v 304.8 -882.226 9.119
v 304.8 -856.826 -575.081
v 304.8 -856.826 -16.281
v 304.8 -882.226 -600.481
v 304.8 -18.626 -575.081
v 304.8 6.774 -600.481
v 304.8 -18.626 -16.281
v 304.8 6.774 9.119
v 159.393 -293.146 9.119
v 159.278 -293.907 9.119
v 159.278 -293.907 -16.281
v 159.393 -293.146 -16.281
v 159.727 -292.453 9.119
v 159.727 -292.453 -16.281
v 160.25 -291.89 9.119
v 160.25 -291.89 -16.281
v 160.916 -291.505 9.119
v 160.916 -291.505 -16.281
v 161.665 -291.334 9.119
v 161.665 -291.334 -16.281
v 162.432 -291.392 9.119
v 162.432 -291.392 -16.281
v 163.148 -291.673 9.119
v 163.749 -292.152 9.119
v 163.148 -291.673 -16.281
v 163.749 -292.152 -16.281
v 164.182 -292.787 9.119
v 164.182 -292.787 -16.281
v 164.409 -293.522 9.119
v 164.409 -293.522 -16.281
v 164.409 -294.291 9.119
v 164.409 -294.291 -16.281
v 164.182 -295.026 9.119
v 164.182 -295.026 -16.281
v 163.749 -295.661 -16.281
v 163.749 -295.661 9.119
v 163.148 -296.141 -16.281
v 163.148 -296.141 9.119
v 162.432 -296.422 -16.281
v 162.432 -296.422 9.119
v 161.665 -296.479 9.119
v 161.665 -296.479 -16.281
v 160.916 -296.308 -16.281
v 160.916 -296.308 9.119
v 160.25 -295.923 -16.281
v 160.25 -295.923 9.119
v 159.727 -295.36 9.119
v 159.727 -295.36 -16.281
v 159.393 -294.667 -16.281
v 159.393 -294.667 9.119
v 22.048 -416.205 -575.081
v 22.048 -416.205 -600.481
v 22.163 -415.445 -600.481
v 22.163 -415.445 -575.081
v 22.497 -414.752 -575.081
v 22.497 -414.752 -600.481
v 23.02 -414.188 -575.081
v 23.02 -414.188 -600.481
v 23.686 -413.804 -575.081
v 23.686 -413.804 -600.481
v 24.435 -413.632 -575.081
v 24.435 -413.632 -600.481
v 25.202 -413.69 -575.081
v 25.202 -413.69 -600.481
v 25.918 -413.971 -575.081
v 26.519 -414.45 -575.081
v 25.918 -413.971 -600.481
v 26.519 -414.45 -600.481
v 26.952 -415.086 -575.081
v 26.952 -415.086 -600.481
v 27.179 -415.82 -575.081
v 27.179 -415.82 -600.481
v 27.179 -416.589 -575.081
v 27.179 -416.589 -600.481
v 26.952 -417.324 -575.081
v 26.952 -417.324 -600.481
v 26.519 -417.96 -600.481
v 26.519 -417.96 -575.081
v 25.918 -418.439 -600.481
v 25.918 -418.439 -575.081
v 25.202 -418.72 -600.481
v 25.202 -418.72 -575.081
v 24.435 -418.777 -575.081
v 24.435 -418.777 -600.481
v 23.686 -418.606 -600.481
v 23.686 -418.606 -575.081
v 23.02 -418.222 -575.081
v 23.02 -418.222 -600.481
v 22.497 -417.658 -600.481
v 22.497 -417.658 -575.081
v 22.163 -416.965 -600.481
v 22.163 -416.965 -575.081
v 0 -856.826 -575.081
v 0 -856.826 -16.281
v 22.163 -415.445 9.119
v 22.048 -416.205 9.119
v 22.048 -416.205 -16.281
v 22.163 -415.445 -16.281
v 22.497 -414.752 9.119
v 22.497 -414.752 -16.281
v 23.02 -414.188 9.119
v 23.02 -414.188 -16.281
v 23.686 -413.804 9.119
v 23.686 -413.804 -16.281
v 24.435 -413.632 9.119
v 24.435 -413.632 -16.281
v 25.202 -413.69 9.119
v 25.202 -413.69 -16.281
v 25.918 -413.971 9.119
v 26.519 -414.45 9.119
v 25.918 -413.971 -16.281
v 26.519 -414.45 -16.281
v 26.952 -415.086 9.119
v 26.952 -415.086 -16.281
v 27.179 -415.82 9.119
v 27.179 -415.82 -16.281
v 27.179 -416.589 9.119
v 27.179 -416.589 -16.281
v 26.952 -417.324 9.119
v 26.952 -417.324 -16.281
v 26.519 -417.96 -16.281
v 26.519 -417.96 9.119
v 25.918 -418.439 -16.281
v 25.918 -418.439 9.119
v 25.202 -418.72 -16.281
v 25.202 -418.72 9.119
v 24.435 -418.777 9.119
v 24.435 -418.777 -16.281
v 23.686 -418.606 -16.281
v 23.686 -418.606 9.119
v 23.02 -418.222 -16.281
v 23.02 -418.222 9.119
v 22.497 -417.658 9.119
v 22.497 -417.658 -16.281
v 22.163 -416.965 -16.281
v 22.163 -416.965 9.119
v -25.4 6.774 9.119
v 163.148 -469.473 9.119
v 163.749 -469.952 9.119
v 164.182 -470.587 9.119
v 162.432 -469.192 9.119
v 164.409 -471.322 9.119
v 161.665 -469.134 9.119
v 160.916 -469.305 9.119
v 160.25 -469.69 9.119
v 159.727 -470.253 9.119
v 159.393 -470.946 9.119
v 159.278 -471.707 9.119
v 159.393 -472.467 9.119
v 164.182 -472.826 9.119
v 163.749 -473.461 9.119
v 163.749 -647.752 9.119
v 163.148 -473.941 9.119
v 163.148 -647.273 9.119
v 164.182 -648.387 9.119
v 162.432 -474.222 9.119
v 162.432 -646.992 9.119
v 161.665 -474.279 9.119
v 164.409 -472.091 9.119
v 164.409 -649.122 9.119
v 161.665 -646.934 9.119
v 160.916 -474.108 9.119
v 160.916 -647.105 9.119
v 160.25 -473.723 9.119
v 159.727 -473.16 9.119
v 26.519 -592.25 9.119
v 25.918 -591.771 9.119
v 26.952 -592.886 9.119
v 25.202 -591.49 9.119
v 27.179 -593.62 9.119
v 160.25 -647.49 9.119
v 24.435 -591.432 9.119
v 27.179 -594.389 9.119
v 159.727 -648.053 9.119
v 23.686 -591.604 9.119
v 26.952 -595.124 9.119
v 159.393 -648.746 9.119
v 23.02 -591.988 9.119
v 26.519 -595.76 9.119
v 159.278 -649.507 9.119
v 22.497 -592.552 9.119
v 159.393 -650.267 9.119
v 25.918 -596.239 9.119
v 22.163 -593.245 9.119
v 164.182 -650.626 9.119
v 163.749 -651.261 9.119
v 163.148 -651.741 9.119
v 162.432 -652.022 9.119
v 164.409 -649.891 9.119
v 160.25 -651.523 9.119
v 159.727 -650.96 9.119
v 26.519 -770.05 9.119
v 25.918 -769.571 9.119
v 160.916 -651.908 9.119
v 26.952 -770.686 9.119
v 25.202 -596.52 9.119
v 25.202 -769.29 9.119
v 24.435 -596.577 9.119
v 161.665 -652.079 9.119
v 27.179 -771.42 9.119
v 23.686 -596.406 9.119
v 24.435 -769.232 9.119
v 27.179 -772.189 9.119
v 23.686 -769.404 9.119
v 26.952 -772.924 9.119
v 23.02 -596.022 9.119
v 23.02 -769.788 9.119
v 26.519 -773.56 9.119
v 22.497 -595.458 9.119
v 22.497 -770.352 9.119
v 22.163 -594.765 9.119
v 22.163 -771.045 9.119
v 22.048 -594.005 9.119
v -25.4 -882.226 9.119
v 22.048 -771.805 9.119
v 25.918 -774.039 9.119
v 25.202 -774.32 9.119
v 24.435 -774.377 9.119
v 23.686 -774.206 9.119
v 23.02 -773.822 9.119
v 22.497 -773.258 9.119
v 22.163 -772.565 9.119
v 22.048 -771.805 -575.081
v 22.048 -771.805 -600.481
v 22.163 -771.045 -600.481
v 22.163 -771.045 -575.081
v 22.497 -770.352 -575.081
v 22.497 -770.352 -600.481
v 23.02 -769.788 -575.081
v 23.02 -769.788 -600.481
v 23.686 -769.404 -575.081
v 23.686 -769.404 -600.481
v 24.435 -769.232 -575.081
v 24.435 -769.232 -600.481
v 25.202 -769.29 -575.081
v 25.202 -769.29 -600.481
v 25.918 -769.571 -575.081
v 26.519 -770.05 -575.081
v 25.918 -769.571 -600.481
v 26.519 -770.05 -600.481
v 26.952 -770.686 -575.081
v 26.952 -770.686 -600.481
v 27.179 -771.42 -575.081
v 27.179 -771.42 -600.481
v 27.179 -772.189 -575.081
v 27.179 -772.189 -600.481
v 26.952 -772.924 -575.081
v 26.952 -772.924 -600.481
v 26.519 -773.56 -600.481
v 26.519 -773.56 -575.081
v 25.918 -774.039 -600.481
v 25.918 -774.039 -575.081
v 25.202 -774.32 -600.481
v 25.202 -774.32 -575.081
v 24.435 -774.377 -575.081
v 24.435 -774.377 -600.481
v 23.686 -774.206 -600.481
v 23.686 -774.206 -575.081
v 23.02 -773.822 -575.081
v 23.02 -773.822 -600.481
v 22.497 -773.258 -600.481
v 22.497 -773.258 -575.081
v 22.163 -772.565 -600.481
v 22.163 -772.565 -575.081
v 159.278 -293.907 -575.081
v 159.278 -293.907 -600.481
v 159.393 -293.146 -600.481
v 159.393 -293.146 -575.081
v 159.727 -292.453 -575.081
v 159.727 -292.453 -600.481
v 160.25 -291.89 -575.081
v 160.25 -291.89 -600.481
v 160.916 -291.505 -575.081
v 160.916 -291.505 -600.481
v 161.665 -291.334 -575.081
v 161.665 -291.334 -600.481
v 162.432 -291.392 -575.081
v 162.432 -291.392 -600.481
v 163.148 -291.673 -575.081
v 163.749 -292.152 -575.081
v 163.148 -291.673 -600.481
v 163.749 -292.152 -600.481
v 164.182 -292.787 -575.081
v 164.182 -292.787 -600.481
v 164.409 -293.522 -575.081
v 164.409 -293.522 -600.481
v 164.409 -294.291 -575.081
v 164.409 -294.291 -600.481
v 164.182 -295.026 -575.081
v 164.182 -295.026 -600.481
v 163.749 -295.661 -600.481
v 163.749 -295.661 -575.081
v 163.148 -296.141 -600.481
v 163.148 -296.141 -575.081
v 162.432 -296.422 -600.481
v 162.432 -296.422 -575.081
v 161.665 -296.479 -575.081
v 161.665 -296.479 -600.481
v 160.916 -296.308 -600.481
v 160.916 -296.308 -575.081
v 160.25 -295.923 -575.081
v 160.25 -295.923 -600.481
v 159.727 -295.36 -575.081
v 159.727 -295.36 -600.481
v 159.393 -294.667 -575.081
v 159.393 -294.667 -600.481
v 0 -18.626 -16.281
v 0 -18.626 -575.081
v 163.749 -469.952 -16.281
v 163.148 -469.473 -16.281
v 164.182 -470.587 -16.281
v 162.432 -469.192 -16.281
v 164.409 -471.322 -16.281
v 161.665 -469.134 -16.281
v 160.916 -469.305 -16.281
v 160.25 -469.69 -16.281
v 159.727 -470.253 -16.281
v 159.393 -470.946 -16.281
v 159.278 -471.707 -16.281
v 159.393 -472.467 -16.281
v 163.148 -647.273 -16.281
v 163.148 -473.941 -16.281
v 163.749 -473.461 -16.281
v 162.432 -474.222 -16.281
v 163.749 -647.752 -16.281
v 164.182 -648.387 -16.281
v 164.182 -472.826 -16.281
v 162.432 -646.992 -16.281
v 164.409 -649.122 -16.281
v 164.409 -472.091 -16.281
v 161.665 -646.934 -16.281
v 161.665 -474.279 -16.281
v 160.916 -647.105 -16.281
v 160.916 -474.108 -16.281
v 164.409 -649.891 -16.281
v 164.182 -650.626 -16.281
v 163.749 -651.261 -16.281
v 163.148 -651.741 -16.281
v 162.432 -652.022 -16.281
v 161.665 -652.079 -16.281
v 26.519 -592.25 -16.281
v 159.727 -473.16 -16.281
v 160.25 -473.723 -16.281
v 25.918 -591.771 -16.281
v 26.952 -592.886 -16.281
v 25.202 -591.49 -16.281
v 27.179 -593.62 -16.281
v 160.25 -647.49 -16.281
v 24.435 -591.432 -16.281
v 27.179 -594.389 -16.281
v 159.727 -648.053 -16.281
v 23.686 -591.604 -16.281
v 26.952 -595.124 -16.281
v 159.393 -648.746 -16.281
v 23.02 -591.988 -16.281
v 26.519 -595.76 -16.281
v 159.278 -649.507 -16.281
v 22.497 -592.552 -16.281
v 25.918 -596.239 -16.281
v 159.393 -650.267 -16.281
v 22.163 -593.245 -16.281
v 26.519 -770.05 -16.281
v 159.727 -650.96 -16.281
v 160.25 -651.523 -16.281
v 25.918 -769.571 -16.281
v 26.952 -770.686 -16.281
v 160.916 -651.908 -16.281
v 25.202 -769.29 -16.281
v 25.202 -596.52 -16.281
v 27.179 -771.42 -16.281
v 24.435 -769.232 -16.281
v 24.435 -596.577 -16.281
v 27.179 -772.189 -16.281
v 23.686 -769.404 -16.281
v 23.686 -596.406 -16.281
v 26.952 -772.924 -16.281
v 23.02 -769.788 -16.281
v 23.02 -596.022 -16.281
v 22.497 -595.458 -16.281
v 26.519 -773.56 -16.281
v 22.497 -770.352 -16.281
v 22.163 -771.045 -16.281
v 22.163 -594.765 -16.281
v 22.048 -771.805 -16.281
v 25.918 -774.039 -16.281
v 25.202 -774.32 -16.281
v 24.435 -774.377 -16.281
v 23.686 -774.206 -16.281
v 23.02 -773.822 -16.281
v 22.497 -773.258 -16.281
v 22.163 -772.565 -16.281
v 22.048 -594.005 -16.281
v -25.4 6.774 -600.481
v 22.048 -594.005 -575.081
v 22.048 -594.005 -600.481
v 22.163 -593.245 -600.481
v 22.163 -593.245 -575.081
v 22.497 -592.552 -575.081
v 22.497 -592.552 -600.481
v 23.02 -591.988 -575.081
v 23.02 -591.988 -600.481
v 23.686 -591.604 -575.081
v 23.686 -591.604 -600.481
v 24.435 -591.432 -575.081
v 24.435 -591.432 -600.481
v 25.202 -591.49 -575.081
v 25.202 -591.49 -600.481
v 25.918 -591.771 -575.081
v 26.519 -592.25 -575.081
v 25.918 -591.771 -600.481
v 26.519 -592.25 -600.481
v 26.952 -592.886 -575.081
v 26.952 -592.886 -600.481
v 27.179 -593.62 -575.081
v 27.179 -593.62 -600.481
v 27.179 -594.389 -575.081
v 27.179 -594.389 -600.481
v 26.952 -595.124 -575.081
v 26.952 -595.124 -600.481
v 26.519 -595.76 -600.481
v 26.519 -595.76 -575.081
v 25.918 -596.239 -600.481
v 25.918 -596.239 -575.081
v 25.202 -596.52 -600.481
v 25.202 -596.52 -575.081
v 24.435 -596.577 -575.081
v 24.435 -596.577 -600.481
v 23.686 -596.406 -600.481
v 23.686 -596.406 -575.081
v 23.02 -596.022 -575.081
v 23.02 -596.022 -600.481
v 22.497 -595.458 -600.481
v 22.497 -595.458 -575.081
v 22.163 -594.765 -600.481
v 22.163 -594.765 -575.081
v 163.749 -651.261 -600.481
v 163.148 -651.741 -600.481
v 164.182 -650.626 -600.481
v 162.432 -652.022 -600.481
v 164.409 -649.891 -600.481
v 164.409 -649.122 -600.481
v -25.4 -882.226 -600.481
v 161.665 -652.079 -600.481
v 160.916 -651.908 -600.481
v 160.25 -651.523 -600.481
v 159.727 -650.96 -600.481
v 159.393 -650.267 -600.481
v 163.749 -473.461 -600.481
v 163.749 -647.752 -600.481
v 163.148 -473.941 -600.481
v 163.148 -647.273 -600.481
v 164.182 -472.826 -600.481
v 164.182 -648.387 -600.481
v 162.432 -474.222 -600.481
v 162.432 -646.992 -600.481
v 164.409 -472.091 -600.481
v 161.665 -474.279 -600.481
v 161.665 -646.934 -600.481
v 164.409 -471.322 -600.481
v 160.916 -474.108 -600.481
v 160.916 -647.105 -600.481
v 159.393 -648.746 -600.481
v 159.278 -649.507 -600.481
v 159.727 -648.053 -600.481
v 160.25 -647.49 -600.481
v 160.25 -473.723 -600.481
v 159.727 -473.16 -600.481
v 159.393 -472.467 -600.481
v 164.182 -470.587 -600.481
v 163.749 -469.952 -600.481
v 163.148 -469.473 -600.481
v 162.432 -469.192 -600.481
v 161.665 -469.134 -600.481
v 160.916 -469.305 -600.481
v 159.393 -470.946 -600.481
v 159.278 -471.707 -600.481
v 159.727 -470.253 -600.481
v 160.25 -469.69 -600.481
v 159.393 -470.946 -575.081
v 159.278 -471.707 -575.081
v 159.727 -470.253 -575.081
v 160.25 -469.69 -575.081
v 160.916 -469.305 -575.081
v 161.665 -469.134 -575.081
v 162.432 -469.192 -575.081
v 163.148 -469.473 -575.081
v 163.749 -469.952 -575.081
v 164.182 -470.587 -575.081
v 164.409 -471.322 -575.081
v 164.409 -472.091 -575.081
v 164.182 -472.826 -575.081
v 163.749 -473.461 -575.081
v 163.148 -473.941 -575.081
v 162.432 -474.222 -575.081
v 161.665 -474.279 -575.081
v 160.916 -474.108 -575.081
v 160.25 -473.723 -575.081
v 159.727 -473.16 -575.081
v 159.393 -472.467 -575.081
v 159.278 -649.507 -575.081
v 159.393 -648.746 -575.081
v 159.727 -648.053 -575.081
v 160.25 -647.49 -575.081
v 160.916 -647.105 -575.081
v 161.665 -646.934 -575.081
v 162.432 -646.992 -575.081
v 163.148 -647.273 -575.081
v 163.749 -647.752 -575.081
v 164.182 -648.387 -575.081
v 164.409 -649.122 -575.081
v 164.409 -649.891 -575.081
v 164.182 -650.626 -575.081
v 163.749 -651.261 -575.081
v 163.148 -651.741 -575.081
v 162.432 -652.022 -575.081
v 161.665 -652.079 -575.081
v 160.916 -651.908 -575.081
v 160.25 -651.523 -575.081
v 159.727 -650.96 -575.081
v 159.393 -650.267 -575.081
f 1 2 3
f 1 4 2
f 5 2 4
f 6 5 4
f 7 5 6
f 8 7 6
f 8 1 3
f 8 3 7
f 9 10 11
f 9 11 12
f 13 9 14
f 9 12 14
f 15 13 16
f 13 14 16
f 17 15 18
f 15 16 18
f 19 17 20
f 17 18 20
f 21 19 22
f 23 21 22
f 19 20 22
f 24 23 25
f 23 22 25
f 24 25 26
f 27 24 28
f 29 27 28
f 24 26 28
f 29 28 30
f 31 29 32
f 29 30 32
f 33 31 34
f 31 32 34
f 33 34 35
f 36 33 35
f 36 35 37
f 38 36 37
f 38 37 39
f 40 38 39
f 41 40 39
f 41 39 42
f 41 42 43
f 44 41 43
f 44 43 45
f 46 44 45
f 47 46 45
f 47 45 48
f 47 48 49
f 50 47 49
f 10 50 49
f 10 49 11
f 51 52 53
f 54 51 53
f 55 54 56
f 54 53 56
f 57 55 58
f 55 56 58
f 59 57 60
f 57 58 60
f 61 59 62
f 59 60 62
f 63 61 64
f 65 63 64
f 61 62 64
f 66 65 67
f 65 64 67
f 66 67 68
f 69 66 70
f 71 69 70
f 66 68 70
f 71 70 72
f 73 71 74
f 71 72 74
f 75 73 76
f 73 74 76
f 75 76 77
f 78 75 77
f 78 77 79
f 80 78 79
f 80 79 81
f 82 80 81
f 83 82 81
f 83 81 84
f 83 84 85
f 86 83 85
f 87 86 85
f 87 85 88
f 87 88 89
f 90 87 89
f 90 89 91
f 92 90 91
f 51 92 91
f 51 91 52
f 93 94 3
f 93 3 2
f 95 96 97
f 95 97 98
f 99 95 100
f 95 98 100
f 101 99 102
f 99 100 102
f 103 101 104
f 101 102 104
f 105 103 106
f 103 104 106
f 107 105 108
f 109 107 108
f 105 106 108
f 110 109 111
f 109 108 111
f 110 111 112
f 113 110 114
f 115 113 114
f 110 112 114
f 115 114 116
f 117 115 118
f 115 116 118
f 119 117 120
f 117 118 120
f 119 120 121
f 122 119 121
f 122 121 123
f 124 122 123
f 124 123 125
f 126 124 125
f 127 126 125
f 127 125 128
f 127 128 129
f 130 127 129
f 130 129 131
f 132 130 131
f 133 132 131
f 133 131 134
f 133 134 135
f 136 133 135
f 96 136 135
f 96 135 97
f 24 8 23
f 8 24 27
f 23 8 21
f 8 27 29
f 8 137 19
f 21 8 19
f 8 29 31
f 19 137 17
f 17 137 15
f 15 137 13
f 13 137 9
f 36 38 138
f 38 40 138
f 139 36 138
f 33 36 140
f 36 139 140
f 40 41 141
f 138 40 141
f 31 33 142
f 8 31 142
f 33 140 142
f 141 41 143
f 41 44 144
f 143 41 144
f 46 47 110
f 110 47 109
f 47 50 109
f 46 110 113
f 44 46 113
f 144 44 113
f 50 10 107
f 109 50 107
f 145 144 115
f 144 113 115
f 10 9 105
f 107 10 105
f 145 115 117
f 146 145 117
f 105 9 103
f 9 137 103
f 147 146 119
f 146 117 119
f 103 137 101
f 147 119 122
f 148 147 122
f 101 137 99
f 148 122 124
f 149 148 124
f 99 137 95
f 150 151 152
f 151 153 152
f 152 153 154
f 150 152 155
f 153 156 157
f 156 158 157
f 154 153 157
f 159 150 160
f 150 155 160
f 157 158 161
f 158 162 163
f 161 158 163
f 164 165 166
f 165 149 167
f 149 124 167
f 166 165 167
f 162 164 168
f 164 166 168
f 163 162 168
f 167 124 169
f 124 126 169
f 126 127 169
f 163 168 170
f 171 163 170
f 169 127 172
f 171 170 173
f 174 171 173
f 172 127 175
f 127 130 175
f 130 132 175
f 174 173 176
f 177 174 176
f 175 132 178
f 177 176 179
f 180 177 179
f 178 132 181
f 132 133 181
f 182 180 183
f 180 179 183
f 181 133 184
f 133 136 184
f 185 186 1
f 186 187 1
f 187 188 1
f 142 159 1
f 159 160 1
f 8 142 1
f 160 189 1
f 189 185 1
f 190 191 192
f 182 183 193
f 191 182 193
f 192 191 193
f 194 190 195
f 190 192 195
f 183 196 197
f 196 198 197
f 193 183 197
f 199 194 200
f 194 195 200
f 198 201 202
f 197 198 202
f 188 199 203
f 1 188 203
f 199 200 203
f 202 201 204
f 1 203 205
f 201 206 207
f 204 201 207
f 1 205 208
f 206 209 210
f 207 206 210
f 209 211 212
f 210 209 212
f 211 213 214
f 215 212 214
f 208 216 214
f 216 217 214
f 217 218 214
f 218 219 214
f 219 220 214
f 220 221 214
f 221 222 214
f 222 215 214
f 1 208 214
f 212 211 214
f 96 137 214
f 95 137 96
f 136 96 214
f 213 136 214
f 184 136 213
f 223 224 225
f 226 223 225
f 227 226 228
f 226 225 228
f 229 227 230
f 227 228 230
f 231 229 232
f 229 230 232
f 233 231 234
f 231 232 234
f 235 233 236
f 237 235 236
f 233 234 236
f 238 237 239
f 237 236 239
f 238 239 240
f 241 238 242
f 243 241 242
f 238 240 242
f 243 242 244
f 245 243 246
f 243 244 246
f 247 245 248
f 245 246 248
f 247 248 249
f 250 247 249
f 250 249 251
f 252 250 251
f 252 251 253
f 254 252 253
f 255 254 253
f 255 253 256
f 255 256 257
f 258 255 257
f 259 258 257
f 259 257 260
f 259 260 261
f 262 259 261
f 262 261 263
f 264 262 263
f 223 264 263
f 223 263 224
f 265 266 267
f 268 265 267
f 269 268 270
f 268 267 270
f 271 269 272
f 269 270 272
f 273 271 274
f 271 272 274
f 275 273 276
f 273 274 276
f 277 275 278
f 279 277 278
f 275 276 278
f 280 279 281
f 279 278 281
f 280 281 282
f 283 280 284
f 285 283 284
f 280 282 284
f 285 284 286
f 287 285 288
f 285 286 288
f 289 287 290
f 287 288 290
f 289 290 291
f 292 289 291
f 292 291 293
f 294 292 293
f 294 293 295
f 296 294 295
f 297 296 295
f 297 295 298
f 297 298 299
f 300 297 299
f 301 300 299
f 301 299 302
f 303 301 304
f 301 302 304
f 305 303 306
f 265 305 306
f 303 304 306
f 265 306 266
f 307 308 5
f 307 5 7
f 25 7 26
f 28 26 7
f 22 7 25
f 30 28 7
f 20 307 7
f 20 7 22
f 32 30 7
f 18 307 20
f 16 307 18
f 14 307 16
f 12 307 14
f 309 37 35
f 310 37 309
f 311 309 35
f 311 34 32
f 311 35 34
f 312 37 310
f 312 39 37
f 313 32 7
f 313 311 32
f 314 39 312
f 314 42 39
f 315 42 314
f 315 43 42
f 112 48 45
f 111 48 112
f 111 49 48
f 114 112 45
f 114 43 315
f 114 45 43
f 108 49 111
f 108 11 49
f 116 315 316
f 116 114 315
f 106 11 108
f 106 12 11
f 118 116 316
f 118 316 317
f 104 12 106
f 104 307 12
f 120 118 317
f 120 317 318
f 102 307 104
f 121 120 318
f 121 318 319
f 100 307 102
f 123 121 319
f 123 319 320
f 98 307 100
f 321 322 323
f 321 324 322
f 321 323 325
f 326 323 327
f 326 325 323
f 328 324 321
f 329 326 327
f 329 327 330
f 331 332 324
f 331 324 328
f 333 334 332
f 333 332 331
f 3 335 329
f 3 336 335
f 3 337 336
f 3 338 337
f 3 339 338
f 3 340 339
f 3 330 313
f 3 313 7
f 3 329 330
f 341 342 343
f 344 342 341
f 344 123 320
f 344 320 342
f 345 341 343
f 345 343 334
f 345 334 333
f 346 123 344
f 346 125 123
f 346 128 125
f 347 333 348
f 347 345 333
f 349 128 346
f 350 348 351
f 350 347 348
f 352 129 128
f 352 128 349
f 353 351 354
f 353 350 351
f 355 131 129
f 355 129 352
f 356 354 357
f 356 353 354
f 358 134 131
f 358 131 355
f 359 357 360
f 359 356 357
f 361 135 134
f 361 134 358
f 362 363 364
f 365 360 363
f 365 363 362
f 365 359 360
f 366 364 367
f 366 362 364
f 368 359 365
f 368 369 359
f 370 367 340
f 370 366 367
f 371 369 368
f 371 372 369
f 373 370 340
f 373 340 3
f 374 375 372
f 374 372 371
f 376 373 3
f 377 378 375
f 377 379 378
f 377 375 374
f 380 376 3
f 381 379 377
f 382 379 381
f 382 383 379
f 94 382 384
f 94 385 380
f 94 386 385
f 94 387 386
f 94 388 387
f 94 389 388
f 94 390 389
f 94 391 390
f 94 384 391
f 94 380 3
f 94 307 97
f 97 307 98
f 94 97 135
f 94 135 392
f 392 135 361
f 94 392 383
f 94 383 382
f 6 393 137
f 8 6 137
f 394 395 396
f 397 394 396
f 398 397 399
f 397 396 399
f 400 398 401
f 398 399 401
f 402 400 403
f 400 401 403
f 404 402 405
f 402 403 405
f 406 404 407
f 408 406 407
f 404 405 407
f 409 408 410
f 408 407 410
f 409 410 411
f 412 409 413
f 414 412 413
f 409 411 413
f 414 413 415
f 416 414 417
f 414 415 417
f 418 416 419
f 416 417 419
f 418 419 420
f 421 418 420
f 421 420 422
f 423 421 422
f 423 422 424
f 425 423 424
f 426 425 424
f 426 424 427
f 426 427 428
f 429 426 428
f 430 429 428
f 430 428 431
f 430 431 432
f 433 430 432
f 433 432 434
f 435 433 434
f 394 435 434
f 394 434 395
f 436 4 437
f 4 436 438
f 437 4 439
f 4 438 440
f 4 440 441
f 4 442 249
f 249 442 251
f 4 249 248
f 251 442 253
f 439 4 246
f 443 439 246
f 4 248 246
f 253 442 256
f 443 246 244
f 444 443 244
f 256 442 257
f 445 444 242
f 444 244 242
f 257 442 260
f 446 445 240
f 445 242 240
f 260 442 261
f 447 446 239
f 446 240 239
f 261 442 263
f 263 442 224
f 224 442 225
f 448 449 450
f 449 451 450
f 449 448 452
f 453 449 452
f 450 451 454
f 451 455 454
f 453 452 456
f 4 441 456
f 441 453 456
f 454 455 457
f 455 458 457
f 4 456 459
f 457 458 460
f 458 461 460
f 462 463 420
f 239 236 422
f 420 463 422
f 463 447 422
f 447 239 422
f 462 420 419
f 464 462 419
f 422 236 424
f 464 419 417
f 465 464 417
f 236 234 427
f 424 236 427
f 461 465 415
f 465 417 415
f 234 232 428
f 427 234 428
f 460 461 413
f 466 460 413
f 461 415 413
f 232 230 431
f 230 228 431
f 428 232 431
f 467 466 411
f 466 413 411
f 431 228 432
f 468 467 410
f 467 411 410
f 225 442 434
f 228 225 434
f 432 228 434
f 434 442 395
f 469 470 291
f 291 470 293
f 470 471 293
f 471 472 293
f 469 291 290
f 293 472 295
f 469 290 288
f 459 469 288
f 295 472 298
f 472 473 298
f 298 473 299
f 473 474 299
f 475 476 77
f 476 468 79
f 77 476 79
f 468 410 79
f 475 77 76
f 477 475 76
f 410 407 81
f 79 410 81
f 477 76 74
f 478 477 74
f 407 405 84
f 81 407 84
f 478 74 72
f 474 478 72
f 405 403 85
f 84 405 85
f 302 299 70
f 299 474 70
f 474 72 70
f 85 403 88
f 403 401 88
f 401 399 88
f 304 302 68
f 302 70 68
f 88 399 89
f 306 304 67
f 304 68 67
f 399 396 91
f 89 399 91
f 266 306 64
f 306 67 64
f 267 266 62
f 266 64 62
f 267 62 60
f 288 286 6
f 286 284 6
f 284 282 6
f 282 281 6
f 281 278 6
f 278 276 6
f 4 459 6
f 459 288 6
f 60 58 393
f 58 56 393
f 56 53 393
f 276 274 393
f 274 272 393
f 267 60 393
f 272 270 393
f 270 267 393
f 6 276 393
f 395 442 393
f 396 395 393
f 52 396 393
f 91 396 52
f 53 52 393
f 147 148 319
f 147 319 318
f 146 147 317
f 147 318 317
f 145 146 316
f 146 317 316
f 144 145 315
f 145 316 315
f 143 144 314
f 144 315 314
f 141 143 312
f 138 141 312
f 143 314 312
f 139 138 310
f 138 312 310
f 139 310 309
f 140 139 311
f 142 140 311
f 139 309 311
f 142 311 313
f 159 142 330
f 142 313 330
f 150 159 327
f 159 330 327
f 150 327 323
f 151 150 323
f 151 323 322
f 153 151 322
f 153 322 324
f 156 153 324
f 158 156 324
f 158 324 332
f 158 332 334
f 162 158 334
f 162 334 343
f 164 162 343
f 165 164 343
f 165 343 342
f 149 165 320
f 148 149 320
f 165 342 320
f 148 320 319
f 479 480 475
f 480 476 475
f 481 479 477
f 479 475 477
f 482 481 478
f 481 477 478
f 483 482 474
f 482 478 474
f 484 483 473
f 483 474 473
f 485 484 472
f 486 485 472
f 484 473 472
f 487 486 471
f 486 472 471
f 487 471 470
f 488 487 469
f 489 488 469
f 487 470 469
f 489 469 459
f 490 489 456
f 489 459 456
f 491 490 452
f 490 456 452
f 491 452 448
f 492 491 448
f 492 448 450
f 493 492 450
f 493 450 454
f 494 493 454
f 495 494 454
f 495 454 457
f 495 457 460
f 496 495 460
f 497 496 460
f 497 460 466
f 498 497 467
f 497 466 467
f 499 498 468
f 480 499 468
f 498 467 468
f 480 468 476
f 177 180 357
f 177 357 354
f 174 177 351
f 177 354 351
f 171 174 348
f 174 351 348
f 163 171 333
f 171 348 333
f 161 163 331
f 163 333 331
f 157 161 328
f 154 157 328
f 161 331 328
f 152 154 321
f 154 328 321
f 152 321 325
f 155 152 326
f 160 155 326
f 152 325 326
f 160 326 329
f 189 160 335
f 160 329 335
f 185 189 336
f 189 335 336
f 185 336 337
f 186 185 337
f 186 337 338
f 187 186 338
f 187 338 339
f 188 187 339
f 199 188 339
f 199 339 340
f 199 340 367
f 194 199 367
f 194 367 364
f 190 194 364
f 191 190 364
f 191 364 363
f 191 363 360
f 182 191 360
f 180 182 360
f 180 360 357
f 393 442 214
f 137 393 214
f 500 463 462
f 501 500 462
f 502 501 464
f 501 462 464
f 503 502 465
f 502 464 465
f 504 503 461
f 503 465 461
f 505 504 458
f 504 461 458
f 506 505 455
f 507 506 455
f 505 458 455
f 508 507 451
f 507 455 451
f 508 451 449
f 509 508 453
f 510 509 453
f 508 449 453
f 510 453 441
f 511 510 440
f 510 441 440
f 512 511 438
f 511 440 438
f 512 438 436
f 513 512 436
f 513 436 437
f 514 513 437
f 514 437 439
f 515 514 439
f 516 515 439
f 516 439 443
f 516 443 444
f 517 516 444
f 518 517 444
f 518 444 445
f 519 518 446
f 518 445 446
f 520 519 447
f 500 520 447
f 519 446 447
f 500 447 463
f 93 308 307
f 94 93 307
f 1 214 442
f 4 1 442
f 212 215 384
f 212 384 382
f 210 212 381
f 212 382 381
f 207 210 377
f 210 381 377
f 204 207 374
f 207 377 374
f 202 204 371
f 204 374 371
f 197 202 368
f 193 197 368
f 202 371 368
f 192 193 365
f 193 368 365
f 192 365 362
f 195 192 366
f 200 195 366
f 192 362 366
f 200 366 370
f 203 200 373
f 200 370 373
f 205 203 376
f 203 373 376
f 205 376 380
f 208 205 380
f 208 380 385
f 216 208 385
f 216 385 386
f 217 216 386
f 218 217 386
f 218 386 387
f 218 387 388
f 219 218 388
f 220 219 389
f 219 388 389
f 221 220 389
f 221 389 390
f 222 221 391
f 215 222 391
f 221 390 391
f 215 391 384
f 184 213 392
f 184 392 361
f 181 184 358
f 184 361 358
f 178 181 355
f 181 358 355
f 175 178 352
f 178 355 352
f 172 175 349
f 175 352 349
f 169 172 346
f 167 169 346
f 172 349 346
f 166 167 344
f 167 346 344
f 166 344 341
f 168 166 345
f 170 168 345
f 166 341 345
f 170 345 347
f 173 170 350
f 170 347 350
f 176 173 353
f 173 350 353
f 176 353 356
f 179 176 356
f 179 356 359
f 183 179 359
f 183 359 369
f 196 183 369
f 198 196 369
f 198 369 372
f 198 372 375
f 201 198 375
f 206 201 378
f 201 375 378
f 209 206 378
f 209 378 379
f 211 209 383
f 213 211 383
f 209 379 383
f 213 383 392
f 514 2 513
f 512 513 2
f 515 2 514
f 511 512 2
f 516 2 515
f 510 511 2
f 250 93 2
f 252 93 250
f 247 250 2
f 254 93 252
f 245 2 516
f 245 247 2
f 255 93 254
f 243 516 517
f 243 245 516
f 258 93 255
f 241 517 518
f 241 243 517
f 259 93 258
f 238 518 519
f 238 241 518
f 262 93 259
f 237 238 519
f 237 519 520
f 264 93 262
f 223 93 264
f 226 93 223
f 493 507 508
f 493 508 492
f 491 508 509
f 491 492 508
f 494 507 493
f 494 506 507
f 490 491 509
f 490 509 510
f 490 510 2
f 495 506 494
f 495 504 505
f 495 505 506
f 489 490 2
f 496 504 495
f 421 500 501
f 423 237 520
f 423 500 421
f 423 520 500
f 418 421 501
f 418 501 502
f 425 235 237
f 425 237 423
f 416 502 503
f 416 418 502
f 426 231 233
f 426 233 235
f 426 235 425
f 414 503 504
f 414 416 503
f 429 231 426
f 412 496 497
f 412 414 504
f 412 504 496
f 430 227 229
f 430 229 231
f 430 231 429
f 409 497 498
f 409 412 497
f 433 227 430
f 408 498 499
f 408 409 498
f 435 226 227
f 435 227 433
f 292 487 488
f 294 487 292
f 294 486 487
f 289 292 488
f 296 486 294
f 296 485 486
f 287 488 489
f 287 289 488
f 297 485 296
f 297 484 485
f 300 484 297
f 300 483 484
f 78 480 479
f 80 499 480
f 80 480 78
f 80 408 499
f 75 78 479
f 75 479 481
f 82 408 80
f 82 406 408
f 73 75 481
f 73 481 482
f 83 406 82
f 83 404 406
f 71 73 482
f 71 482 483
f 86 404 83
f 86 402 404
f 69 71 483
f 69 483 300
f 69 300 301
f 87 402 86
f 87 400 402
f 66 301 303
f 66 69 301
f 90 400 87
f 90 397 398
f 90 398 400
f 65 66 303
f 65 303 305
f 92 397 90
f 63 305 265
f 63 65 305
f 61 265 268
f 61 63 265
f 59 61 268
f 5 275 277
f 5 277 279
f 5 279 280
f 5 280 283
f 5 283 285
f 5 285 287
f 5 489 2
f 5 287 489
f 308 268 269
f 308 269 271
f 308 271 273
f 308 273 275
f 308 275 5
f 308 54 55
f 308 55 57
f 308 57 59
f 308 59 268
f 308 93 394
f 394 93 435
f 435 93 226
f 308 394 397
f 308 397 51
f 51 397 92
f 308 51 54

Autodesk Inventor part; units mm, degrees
ref_plane "YZ Plane" through (0, 0, 0) normal (1, 0, 0) x (0, 1, 0)
ref_plane "XZ Plane" through (0, 0, 0) normal (0, 1, 0) x (-1, 0, 0)
ref_plane "XY Plane" through (0, 0, 0) normal (0, 0, 1) x (1, 0, 0)
sketch "Sketch1" plane through (0, 0, 0) normal (1, 0, 0) x (0, 1, 0)
  line L0 (6.7738, 9.1186) -> (-882.2262, 9.1186)
  line L1 (-882.2262, 9.1186) -> (-882.2262, -600.4814)
  line L2 (-882.2262, -600.4814) -> (6.7738, -600.4814)
  line L3 (6.7738, -600.4814) -> (6.7738, 9.1186)
  line L4 (-18.6262, -16.2814) -> (-856.8262, -16.2814)
  line L5 (-856.8262, -16.2814) -> (-856.8262, -575.0814)
  line L6 (-856.8262, -575.0814) -> (-18.6262, -575.0814)
  line L7 (-18.6262, -575.0814) -> (-18.6262, -16.2814)
  point P0 (0, 0)
  dimension "d0" = 889
  dimension "d1" = 609.6
  dimension "d2" = 25.4
extrude "Extrusion3" add sketch "Sketch1" along normal blind 304.8
sketch "Sketch4" plane through (0, 0, 0) normal (-1, 0, 0) x (0, 0, 1)
  line L0 (9.1186, 6.7738) -> (9.1186, -882.2262) projected
  line L1 (9.1186, -882.2262) -> (-600.4814, -882.2262) projected
  line L2 (9.1186, 6.7738) -> (-600.4814, 6.7738)
  line L3 (-600.4814, 6.7738) -> (-600.4814, -882.2262)
  line L4 (-600.4814, -882.2262) -> (9.1186, -882.2262)
  line L5 (9.1186, -882.2262) -> (9.1186, 6.7738)
  point P0 (0, 0)
extrude "Extrusion4" add sketch "Sketch4" along normal blind 25.4
sketch "Sketch5" plane through (304.8, -882.2262, -600.4814) normal (0, 0, -1) x (-1, 0, 0)
  line L0 (0, 889) -> (330.2, 889) projected
  line L1 (330.2, 889) -> (330.2, 645.5901)
  line L2 (330.2, 889) -> (330.2, 0) projected
  line L3 (330.2, 457.2) -> (330.2, 279.4)
  line L4 (330.2, 279.4) -> (330.2, 101.6)
  line L5 (330.2, 518.5901) -> (609.6, 518.5901) construction
  line L6 (330.2, 340.7901) -> (609.6, 340.7901) construction
  line L7 (330.2, 162.9901) -> (609.6, 162.9901) construction
  line L8 (330.2, 457.2) -> (280.1718, 466.0213)
  line L9 (330.2, 457.2) -> (381, 457.2) construction
  line L10 (330.2, 279.4) -> (280.1718, 288.2213)
  line L11 (330.2, 279.4) -> (381, 279.4) construction
  line L12 (330.2, 101.6) -> (280.1718, 110.4213)
  line L13 (330.2, 101.6) -> (381, 101.6) construction
  line L14 (330.2, 0) -> (0, 0) projected
  line L15 (330.2, 0) -> (330.2, 101.6)
  circle A0 centre (280.1718, 466.0213) radius 2.5797
  circle A1 centre (280.1718, 288.2213) radius 2.5797
  circle A2 centre (280.1718, 110.4213) radius 2.5797
  line L16 (330.2, 457.2) -> (142.9418, 588.3196)
  line L17 (330.2, 457.2) -> (558.8, 457.2) construction
  line L18 (330.2, 279.4) -> (142.9418, 410.5196)
  line L19 (330.2, 279.4) -> (558.8, 279.4) construction
  line L20 (330.2, 101.6) -> (142.9418, 232.7196)
  line L21 (330.2, 101.6) -> (558.8, 101.6) construction
  circle A3 centre (142.9418, 588.3196) radius 2.5797
  circle A4 centre (142.9418, 410.5196) radius 2.5797
  circle A5 centre (142.9418, 232.7196) radius 2.5797
  point P0 (304.8, 882.2262)
  dimension "d16" = 177.8
  dimension "d17" = 177.8
  dimension "d35" = 50.8
  dimension "d36" = 170
  dimension "d37" = 50.8
  dimension "d38" = 170
  dimension "d39" = 50.8
  dimension "d40" = 170
  dimension "d46" = 101.6
  dimension "d48" = 5.1594
  dimension "d50" = 5.1594
  dimension "d52" = 5.1594
  dimension "d53" = 228.6
  dimension "d54" = 145
  dimension "d55" = 228.6
  dimension "d56" = 145
  dimension "d57" = 228.6
  dimension "d58" = 145
  dimension "d59" = 5.1594
  dimension "d60" = 5.1594
  dimension "d61" = 5.1594
extrude "Extrusion6" cut sketch "Sketch5" against normal blind 914.4
properties part number "Cart Box"
